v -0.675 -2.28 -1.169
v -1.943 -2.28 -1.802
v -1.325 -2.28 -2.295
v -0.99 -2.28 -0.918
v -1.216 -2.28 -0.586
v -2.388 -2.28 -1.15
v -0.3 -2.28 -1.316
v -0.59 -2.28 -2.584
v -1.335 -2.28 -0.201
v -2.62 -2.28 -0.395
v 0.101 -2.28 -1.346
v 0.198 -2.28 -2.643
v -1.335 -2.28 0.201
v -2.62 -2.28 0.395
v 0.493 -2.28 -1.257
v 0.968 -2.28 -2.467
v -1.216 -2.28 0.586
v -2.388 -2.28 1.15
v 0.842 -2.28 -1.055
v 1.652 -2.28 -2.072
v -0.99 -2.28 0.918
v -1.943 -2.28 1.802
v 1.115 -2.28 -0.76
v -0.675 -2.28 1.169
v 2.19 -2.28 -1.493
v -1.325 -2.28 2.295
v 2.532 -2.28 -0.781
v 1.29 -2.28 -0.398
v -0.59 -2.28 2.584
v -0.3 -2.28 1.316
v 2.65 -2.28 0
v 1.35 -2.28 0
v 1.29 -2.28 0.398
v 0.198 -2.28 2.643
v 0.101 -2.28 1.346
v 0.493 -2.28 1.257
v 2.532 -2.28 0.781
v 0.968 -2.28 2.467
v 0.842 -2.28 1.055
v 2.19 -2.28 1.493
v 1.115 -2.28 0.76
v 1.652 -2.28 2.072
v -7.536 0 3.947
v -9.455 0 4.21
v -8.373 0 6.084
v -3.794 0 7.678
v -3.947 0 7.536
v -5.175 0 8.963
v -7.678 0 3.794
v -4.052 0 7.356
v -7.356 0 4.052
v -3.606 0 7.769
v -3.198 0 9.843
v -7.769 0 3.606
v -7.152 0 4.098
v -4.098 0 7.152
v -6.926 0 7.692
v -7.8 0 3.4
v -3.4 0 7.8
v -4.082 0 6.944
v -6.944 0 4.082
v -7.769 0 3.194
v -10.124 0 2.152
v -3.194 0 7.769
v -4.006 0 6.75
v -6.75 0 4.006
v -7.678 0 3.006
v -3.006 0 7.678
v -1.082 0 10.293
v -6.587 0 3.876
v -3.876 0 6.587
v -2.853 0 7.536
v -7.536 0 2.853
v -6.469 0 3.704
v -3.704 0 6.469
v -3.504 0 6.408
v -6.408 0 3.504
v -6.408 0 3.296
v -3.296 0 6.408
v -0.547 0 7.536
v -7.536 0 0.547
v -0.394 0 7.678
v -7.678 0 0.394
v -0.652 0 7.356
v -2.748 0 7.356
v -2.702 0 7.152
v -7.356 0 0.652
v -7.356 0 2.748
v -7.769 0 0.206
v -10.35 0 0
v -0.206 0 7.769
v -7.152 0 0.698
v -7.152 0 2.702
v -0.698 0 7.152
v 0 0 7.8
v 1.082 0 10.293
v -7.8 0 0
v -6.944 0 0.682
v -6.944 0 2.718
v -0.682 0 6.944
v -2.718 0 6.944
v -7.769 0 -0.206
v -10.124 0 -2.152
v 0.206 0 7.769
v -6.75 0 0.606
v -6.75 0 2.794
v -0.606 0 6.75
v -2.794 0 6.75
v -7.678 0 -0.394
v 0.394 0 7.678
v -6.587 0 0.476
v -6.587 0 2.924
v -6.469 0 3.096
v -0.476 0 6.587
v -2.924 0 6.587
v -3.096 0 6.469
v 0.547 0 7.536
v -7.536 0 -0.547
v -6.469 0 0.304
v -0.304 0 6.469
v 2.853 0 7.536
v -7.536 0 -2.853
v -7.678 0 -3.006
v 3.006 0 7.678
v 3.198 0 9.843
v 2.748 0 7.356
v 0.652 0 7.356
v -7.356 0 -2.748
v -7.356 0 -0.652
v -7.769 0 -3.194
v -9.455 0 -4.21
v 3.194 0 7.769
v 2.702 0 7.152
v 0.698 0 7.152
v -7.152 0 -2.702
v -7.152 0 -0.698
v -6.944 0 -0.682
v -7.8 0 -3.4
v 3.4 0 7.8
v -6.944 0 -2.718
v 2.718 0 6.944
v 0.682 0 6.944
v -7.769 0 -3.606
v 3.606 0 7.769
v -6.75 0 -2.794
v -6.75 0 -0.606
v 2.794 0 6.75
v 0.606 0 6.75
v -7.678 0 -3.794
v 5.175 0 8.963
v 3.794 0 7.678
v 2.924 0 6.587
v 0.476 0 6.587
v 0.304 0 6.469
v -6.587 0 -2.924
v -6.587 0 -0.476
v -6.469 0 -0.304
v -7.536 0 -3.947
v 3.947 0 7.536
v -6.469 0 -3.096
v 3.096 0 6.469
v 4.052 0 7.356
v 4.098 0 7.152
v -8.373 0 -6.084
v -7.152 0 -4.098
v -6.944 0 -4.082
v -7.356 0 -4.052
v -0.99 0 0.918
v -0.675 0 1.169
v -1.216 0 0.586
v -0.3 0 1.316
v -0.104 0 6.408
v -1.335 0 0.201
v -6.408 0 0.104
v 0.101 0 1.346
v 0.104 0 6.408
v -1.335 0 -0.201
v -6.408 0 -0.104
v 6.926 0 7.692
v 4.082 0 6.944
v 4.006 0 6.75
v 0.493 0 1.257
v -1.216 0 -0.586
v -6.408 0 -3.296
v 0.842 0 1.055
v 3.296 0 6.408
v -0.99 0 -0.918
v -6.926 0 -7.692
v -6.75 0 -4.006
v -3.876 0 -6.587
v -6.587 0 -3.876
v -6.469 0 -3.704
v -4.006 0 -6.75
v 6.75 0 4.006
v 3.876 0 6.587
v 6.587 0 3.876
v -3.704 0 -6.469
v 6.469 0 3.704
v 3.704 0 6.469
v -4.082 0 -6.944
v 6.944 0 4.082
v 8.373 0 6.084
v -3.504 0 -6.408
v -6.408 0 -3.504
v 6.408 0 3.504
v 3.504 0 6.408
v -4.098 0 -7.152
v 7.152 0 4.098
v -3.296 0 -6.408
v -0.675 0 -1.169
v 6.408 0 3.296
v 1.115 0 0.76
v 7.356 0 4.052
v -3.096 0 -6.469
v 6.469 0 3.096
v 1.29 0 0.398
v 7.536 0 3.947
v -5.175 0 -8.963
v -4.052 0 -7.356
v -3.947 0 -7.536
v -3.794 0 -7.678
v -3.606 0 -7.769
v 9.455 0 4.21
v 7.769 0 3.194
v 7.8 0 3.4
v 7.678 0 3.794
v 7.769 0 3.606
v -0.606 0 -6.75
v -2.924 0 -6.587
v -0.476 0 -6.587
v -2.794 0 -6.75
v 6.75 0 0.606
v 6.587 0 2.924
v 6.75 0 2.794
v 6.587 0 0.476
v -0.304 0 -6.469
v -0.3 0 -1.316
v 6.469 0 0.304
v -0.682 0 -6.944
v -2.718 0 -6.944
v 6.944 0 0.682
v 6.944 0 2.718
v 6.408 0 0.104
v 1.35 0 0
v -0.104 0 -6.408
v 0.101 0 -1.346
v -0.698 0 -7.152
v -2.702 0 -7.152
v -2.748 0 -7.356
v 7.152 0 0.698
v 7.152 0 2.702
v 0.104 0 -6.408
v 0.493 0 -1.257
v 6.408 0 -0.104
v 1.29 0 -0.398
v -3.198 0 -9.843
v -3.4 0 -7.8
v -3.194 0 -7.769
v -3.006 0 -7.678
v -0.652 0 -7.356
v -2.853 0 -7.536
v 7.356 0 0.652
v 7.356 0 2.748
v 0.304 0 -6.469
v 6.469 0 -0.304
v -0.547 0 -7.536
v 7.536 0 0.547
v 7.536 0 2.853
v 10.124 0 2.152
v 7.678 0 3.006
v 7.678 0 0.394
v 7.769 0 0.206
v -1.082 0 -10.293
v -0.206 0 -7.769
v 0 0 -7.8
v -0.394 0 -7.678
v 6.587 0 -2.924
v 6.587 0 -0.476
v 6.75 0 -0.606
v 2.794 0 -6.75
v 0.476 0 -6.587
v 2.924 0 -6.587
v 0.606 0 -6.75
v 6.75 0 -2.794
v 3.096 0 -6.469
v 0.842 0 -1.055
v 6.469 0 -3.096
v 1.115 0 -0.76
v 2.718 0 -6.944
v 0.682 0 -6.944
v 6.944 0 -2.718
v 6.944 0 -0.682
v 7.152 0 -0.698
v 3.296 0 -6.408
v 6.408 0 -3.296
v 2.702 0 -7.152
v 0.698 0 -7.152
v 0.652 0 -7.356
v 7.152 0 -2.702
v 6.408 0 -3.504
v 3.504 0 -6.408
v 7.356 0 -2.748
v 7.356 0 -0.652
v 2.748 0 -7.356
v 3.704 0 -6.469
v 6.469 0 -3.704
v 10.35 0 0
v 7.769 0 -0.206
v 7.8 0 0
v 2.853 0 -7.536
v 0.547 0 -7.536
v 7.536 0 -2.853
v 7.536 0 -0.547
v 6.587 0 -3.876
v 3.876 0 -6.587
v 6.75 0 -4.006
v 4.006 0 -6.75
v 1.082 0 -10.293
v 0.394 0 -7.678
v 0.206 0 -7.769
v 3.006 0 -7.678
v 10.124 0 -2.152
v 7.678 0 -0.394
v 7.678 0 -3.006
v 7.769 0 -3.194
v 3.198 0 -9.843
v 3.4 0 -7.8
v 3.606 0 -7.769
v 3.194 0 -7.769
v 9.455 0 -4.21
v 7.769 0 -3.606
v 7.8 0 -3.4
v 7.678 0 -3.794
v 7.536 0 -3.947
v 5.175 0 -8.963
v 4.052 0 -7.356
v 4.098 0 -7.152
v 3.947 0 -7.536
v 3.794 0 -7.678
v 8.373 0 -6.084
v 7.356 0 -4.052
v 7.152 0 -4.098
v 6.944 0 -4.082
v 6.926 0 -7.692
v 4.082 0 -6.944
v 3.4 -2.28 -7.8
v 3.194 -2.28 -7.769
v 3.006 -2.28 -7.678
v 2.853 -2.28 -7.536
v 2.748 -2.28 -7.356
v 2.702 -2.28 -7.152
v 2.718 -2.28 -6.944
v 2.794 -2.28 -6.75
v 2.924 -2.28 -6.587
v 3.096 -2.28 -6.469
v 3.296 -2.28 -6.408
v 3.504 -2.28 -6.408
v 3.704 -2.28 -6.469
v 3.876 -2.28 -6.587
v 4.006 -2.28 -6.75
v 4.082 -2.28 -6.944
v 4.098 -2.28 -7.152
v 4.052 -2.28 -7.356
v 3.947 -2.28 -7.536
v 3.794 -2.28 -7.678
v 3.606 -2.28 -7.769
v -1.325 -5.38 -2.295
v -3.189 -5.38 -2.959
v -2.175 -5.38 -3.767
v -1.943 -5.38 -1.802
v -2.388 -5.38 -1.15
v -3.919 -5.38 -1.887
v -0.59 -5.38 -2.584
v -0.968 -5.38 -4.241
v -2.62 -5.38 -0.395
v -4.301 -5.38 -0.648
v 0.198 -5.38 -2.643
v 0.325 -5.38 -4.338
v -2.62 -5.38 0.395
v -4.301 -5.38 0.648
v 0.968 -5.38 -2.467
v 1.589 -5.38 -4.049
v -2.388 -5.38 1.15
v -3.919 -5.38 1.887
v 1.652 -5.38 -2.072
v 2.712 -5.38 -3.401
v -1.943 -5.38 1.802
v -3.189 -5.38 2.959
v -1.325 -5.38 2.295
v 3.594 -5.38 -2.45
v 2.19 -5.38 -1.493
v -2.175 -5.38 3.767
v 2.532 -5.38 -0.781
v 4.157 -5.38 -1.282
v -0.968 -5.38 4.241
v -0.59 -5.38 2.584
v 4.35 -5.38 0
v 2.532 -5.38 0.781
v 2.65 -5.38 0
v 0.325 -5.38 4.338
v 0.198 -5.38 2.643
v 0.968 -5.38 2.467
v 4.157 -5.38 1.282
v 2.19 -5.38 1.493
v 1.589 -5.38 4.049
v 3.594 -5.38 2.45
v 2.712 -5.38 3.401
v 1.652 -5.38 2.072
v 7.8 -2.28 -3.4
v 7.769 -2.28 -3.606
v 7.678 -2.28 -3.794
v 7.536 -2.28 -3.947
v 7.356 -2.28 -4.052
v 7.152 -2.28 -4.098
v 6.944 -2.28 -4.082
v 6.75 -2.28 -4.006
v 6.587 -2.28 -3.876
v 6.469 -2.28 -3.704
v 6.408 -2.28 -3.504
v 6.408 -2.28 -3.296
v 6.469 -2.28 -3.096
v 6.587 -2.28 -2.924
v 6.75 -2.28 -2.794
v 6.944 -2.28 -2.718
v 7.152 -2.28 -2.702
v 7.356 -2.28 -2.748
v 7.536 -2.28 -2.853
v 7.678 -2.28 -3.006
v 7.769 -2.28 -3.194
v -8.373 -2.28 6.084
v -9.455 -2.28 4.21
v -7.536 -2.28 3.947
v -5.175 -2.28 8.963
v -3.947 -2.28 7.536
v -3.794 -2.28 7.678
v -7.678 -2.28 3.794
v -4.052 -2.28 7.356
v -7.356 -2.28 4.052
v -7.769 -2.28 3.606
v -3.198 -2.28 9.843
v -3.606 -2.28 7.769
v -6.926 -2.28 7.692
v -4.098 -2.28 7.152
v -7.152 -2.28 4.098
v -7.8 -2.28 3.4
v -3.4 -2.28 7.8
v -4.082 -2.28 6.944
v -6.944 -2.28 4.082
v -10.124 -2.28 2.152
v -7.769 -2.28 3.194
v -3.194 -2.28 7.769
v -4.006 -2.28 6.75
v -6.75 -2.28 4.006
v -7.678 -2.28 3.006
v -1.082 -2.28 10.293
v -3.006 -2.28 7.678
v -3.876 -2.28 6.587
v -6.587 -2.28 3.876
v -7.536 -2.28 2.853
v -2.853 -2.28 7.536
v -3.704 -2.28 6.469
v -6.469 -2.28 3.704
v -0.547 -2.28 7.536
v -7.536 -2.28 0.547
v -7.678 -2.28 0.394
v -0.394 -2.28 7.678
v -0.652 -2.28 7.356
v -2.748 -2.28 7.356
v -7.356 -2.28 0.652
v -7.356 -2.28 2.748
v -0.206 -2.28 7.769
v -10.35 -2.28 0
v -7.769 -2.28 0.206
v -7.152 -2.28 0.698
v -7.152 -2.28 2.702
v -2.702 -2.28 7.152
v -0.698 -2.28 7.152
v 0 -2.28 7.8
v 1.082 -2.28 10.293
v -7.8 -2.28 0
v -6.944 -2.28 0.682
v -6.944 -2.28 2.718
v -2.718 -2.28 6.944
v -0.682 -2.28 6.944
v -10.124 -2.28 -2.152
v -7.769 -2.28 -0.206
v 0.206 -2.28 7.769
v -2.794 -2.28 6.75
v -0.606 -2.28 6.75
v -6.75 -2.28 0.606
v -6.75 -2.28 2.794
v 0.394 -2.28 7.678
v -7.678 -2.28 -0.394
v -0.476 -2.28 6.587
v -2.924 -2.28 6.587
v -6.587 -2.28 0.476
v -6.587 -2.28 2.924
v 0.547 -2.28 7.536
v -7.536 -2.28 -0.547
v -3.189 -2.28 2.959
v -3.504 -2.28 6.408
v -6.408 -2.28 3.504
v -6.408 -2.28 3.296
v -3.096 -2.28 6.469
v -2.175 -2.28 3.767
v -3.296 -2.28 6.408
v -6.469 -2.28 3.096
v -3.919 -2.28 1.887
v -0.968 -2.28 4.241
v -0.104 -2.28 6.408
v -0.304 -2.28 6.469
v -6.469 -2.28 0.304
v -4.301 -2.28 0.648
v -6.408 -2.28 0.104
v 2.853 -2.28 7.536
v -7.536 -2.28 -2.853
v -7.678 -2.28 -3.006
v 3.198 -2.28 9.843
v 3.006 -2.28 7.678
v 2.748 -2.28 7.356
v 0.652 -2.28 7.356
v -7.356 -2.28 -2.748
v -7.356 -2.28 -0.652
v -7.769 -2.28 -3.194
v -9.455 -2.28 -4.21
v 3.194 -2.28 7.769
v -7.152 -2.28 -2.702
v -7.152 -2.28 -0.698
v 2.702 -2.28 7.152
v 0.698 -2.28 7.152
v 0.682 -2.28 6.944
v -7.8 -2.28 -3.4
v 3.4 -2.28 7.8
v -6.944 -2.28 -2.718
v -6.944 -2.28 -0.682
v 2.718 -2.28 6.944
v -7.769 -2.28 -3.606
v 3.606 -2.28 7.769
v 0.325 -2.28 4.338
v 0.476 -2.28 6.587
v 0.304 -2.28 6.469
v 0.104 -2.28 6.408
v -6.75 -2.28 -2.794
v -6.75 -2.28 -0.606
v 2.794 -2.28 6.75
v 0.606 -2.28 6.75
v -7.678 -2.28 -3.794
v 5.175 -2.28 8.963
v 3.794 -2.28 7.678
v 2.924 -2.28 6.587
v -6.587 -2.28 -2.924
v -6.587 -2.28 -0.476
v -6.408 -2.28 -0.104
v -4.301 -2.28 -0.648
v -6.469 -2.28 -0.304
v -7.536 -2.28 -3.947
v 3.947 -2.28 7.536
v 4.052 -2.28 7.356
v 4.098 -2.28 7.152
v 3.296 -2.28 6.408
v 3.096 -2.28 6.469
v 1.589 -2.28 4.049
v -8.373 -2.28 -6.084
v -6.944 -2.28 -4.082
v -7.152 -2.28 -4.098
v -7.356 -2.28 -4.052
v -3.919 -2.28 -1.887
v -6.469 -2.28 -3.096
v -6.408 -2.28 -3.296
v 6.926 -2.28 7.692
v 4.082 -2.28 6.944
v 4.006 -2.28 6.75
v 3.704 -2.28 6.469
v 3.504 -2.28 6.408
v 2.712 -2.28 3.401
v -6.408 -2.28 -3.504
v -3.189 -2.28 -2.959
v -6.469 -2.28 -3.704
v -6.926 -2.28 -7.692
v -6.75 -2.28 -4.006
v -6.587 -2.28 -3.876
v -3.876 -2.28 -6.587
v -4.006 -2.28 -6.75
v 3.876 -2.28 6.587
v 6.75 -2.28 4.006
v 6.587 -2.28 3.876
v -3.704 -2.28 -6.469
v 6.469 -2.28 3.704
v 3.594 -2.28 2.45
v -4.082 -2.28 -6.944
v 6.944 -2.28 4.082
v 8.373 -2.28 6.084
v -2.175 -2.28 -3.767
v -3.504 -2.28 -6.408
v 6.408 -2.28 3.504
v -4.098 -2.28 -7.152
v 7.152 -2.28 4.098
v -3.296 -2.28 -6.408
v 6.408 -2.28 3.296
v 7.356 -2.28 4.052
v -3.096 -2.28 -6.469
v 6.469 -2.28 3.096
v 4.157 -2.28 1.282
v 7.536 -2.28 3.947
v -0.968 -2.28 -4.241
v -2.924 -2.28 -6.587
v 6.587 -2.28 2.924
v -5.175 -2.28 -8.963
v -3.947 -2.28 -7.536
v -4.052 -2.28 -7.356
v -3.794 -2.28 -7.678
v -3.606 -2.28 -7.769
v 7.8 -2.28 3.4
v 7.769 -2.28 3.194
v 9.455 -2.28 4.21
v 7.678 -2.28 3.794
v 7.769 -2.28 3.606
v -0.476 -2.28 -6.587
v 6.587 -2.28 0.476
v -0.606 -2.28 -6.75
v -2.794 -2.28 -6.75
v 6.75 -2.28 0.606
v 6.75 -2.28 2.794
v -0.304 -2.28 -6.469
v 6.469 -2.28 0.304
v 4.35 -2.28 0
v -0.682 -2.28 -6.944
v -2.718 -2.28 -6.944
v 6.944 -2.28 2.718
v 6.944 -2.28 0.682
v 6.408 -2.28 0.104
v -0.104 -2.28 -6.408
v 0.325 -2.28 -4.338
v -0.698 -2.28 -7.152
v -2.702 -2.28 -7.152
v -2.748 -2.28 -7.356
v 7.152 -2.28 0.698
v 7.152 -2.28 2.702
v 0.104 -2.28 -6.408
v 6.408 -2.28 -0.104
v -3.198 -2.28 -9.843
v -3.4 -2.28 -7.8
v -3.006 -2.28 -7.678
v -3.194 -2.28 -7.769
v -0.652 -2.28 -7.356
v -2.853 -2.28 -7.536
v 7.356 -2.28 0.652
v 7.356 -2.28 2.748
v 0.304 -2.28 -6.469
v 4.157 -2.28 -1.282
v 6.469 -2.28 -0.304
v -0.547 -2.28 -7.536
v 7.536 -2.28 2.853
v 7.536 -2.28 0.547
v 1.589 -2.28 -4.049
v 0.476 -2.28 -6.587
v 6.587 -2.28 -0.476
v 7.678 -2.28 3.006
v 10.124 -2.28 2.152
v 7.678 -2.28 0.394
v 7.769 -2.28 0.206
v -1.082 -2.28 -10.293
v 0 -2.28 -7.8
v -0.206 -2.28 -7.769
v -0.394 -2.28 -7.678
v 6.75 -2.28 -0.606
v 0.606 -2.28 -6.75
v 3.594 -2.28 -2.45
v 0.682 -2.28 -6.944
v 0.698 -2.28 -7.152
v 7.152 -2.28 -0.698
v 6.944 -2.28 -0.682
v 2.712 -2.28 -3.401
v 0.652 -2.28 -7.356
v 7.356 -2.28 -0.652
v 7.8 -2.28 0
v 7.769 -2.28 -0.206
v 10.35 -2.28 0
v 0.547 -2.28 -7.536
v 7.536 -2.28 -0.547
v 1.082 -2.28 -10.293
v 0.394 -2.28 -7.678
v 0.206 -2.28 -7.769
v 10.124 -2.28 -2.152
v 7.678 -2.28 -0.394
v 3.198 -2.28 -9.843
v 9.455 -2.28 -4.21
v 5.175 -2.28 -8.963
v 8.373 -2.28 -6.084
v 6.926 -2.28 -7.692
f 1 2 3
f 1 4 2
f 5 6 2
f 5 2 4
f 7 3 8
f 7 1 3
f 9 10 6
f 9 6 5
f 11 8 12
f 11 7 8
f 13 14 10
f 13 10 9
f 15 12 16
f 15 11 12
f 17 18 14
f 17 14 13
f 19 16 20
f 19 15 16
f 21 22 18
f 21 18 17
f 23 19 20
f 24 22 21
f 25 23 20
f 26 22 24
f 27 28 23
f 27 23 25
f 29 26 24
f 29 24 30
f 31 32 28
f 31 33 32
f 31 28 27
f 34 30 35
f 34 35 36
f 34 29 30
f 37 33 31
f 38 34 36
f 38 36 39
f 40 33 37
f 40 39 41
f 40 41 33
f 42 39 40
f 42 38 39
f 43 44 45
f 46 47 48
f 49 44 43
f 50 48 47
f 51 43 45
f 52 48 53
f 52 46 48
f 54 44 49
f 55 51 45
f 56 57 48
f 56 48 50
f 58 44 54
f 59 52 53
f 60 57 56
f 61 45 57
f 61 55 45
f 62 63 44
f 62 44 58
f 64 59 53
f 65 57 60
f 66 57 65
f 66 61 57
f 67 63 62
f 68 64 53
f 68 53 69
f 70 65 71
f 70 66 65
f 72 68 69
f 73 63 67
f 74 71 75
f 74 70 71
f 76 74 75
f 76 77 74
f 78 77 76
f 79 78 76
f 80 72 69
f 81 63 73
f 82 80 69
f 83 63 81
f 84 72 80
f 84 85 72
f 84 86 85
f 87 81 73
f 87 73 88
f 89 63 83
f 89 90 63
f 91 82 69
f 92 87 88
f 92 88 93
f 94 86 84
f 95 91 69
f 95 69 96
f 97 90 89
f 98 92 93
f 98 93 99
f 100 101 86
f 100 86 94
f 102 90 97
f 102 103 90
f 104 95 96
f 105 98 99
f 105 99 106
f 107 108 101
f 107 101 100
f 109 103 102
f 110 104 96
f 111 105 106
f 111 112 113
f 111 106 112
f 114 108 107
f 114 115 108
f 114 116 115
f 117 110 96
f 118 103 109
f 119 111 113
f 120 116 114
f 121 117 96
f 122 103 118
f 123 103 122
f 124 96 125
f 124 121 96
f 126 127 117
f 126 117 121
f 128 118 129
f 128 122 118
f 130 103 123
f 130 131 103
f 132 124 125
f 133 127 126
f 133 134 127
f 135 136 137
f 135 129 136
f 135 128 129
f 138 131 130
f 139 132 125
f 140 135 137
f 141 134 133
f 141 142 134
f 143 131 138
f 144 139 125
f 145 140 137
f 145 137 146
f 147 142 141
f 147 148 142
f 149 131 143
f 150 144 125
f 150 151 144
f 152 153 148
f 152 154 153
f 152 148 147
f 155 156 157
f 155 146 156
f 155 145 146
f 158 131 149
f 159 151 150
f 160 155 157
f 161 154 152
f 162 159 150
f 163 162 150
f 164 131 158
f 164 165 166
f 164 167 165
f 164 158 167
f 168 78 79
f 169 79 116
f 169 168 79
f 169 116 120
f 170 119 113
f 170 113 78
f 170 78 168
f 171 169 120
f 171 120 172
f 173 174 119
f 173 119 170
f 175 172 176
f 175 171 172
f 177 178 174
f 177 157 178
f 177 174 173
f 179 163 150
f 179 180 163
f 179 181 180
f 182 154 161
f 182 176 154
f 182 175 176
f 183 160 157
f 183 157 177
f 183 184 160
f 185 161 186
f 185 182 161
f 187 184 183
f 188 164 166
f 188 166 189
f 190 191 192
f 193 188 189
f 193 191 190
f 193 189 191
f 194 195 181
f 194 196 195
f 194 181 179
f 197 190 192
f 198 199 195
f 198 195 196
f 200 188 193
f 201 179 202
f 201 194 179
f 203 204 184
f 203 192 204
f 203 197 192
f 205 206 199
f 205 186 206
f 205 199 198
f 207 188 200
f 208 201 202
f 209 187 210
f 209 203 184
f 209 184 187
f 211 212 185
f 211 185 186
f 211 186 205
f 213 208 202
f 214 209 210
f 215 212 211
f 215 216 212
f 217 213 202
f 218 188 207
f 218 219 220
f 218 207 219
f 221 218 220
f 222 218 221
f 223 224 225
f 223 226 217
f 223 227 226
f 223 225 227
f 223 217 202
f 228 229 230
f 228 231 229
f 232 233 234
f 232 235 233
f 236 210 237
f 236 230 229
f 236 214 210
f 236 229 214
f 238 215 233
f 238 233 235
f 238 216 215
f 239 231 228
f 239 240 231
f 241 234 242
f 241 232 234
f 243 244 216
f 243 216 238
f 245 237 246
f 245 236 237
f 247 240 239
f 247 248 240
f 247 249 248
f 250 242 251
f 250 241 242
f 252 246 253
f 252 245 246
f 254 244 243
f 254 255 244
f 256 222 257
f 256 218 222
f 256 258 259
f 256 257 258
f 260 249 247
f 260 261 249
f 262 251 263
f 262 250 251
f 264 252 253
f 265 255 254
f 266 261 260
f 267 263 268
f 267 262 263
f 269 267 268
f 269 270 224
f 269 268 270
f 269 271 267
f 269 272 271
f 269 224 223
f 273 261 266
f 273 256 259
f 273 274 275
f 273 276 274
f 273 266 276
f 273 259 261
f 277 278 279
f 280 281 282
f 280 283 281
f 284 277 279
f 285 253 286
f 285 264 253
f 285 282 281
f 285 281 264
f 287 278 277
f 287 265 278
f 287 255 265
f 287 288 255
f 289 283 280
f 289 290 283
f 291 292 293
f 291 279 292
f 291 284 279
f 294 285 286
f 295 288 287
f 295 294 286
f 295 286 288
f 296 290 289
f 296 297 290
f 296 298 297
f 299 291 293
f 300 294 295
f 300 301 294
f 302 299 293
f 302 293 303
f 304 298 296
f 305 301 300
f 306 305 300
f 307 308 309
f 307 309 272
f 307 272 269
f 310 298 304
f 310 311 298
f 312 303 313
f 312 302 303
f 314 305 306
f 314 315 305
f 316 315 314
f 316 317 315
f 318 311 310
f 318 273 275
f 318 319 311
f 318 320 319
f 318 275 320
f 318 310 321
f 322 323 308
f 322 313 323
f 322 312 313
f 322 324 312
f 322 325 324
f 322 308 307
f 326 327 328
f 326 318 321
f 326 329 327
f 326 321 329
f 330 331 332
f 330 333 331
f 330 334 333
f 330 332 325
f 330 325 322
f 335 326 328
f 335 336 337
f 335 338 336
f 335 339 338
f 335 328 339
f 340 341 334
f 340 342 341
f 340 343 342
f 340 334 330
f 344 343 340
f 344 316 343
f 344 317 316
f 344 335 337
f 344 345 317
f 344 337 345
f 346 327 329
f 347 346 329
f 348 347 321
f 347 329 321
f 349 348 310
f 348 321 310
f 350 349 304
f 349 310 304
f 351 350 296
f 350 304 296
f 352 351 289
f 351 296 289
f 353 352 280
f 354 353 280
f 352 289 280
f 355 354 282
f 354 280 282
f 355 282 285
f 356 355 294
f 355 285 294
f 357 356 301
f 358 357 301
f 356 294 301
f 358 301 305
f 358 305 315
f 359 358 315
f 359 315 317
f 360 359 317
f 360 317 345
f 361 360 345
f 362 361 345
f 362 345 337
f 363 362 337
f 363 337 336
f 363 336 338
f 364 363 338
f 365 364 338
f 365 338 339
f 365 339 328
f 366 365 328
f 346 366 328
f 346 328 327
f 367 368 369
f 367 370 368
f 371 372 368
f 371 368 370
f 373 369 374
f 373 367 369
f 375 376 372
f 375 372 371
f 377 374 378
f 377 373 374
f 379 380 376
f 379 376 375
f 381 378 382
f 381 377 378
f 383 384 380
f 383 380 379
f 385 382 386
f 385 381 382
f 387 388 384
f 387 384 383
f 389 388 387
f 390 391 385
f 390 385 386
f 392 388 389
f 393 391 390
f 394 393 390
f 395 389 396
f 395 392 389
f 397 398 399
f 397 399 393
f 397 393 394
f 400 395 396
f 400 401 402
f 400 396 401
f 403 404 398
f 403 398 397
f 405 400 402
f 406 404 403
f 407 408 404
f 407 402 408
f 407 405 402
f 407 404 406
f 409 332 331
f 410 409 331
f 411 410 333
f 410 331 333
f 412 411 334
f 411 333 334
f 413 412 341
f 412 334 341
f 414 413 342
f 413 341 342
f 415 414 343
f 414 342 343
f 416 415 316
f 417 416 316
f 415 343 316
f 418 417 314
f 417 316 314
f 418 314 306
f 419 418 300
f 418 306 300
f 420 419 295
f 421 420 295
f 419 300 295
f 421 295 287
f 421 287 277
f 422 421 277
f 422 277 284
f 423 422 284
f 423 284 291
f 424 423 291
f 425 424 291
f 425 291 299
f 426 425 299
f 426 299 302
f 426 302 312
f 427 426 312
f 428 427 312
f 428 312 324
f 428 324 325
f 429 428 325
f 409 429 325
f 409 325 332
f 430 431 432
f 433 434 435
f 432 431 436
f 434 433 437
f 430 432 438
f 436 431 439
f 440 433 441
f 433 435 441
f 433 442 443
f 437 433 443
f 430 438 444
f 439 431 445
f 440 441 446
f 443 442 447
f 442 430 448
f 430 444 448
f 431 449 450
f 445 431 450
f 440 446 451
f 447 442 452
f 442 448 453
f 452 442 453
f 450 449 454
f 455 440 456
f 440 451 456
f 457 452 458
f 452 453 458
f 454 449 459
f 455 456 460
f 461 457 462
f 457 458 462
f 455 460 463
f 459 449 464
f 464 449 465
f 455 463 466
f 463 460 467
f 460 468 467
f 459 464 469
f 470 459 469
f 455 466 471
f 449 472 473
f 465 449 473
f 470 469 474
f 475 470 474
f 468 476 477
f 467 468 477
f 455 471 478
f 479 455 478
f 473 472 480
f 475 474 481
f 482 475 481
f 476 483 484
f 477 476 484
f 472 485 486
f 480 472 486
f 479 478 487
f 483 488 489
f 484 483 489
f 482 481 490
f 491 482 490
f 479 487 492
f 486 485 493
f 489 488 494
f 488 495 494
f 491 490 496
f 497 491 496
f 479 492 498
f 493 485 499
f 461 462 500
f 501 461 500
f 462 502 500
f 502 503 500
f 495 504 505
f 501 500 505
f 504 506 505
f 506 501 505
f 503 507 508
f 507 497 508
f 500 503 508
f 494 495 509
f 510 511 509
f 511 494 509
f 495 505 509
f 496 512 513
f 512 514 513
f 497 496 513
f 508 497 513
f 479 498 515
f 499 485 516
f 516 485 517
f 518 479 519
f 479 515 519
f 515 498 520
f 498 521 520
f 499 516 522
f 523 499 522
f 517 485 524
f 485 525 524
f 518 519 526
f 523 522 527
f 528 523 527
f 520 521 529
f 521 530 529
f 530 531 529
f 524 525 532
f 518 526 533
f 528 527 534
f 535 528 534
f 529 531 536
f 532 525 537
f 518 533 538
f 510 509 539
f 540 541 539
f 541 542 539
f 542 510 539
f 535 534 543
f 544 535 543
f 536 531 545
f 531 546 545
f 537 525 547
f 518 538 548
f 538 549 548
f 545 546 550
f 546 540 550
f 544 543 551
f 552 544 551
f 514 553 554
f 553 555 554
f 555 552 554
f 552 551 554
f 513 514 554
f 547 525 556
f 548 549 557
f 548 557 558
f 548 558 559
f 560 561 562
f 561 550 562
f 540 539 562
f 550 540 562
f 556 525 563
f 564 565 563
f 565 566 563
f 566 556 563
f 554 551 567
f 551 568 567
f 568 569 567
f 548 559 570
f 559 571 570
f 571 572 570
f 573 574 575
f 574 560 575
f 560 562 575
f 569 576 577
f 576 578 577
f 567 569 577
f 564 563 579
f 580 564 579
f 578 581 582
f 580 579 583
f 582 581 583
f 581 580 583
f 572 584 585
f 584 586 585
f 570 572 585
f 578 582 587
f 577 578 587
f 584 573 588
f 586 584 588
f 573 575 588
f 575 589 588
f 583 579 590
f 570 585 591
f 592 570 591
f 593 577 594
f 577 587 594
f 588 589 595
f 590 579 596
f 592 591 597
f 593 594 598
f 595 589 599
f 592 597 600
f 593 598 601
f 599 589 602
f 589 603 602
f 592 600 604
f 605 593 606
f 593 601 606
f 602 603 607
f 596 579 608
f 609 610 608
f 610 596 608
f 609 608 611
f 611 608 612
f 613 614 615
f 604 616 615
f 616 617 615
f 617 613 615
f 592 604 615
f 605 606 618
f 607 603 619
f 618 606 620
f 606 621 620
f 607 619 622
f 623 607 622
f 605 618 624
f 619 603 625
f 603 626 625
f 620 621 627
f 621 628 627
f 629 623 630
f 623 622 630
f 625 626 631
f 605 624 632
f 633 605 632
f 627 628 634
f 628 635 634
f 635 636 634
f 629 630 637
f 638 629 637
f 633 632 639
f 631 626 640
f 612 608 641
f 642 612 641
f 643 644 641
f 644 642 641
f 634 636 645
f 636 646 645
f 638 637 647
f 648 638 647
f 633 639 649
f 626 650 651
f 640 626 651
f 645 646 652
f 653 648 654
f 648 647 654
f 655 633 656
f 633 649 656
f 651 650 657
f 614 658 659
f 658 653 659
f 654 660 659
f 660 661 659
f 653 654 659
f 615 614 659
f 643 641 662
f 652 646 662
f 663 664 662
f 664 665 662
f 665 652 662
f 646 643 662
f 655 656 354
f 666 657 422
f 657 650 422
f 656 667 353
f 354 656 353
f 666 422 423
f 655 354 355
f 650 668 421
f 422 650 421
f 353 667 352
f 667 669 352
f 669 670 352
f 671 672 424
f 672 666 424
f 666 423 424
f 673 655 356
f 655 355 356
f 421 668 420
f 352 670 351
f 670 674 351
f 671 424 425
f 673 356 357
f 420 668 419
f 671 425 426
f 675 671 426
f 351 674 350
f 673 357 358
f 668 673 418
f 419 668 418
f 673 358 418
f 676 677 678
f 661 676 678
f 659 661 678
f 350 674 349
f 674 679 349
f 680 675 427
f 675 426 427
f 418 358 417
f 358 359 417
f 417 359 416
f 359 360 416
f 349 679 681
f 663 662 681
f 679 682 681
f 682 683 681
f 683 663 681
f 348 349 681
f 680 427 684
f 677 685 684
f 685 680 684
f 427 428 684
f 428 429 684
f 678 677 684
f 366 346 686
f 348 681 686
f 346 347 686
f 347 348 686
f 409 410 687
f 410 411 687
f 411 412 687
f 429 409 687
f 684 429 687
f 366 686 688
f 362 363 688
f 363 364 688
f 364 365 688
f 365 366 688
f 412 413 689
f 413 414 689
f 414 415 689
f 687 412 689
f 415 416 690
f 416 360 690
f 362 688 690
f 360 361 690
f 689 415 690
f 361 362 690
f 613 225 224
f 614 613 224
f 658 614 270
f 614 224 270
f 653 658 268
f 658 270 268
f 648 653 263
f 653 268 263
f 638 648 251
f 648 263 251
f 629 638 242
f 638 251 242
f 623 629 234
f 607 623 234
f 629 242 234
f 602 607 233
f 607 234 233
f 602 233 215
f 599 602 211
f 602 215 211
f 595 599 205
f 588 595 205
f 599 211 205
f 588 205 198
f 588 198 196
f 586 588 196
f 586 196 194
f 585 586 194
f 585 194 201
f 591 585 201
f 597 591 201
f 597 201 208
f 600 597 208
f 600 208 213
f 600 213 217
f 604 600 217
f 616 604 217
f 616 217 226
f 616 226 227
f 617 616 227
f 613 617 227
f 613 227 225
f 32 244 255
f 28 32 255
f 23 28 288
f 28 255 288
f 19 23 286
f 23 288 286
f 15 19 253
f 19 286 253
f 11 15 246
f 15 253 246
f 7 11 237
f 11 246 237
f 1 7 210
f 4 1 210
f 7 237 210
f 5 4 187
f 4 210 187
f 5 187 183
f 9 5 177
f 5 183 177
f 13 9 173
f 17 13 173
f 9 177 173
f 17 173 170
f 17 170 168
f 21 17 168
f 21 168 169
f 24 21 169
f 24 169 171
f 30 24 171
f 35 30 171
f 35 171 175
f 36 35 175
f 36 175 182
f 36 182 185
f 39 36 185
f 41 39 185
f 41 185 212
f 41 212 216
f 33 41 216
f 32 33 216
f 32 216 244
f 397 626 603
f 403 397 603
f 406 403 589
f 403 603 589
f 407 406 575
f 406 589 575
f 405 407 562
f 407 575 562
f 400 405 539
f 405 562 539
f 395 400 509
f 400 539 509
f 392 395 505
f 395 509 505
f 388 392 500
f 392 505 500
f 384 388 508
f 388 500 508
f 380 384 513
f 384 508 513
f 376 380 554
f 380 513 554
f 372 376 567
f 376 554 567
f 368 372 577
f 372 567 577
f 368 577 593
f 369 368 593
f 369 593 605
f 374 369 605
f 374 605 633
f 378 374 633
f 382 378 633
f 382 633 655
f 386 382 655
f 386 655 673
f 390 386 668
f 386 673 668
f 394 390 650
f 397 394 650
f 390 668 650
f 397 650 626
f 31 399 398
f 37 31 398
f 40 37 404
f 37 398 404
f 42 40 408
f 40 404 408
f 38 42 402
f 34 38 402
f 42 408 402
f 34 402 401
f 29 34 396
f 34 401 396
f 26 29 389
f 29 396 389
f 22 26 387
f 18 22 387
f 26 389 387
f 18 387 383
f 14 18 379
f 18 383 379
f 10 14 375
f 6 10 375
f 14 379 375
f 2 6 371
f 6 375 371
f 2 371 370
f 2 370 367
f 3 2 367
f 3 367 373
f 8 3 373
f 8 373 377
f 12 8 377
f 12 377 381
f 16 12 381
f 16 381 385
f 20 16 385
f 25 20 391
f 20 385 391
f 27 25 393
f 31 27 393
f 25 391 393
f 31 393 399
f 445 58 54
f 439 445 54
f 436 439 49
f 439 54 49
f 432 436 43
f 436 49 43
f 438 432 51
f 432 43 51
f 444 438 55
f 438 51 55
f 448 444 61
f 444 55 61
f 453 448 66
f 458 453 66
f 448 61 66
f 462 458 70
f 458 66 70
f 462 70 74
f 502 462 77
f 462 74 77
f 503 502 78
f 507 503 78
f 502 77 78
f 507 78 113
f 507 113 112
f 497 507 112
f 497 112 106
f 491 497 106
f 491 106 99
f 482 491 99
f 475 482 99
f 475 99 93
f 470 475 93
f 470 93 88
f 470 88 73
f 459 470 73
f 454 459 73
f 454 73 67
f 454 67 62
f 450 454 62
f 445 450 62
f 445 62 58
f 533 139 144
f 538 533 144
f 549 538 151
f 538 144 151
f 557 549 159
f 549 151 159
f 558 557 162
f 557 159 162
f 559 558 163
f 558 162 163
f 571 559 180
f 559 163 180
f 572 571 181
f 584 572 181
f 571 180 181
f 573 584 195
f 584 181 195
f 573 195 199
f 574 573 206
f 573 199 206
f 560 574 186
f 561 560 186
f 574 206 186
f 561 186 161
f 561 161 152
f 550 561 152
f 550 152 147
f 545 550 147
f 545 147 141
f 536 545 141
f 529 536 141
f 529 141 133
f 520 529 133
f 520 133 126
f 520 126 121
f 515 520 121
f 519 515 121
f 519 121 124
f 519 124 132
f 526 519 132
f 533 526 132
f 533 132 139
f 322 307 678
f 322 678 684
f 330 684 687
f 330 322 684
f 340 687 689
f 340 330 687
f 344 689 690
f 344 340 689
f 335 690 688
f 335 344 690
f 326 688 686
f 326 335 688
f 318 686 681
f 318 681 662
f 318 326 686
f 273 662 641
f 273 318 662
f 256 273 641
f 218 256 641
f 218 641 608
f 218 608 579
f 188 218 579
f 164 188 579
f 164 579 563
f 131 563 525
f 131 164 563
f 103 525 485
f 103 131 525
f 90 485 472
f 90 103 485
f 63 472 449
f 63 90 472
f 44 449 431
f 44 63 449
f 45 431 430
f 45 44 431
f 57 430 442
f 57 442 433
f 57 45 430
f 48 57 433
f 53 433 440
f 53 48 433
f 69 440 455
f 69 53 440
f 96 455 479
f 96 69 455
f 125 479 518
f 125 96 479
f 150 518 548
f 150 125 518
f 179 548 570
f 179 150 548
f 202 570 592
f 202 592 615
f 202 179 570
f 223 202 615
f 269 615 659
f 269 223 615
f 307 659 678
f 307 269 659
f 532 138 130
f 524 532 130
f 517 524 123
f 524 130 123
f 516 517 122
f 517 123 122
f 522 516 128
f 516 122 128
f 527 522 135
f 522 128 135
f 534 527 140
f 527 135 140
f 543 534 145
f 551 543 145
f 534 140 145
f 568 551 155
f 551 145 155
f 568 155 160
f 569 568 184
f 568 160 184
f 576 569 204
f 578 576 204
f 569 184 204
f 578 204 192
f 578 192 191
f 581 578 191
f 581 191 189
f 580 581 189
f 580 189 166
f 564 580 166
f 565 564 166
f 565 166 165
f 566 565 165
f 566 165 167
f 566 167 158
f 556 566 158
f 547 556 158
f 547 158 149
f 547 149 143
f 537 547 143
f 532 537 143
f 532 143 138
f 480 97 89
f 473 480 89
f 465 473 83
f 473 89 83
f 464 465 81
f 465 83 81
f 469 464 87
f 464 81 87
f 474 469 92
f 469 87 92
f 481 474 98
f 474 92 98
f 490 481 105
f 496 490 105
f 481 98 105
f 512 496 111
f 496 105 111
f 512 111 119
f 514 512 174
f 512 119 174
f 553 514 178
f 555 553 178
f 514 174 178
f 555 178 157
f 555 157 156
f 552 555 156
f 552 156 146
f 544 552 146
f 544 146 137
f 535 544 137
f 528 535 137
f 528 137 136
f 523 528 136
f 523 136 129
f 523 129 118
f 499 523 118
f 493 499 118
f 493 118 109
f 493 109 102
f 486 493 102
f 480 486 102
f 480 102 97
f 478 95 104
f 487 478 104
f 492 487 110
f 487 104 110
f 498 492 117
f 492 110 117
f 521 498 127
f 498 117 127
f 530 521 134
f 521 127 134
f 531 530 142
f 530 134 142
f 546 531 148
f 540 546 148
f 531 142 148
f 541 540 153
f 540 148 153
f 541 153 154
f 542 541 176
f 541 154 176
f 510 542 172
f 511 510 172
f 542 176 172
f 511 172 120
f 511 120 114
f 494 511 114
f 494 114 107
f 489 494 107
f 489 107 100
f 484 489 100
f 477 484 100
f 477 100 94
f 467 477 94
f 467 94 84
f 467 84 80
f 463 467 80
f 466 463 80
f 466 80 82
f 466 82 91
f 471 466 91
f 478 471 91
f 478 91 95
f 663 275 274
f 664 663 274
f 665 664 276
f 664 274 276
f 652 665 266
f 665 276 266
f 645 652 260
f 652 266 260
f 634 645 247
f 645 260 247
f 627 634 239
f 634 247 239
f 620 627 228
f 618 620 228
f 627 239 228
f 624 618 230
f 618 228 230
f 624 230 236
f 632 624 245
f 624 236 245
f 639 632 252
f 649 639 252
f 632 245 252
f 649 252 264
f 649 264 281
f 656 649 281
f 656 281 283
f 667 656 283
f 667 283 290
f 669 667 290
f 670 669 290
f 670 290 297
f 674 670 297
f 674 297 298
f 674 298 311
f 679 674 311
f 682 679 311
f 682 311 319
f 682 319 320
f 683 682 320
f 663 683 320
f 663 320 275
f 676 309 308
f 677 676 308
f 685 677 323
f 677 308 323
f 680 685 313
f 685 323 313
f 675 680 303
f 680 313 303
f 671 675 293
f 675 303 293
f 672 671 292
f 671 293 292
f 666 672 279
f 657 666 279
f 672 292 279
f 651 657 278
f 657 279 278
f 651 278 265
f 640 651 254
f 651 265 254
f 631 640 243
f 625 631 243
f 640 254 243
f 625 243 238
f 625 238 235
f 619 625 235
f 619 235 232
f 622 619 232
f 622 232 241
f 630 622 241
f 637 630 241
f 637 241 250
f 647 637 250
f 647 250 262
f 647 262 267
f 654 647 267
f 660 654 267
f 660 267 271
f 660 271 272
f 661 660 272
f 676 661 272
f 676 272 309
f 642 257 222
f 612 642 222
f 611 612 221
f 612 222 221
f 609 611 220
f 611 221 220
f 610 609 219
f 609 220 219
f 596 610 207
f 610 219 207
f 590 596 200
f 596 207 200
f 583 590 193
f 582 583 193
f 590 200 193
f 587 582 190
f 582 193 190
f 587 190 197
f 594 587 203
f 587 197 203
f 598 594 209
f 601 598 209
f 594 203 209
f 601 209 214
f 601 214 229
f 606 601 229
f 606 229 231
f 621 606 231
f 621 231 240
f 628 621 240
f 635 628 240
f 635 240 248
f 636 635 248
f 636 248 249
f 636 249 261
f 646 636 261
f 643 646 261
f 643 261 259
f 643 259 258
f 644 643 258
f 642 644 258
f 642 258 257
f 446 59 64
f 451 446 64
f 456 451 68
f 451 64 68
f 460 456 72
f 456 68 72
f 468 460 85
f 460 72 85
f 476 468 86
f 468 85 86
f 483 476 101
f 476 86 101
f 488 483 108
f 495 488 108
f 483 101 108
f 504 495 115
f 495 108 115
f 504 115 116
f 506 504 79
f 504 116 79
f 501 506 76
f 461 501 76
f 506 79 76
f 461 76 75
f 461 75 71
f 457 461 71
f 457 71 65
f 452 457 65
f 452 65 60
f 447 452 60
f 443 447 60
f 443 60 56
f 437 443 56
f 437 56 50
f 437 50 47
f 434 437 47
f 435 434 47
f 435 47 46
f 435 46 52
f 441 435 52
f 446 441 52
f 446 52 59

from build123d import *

# Parameters (mm, degrees)
SKETCH1_R           = 10.35
BOSS_EXTRUDE1_DEPTH = 2.28
SKETCH2_R           = 4.35
BOSS_EXTRUDE2_DEPTH = 3.1
SKETCH3_R           = 1.35
CUT_EXTRUDE1_DEPTH  = 6.38
SKETCH4_R           = 2.65
CUT_EXTRUDE2_DEPTH  = 3.1
SKETCH5_R           = 0.7
CUT_EXTRUDE3_DEPTH  = 3.1
CIRPATTERN1_COUNT   = 4


with BuildPart() as part:
    # Sketch1 → Boss-Extrude1 (new body)
    with BuildSketch(Plane(origin=(0, 0, 0), x_dir=(1, 0, 0), z_dir=(0, 1, 0))):
        Circle(SKETCH1_R)
    extrude(amount=-BOSS_EXTRUDE1_DEPTH)

    # Sketch2 → Boss-Extrude2 (add)
    with BuildSketch(Plane.XZ.offset(2.28)):
        Circle(SKETCH2_R)
    extrude(amount=BOSS_EXTRUDE2_DEPTH)

    # Sketch3 → Cut-Extrude1 (cut, through all)
    with BuildSketch(Plane(origin=(0, 0, 0), x_dir=(1, 0, 0), z_dir=(0, 1, 0))):
        Circle(SKETCH3_R)
    extrude(amount=-CUT_EXTRUDE1_DEPTH, mode=Mode.SUBTRACT)

    # Sketch4 → Cut-Extrude2 (cut)
    with BuildSketch(Plane.XZ.offset(5.38)):
        Circle(SKETCH4_R)
    extrude(amount=-CUT_EXTRUDE2_DEPTH, mode=Mode.SUBTRACT)

    # Sketch5 → Cut-Extrude3 (cut)
    with BuildSketch(Plane(origin=(0, 0, 0), x_dir=(1, 0, 0), z_dir=(0, 1, 0))):
        with Locations((7.1, 3.4)):
            Circle(SKETCH5_R)
        with Locations((7.1, 0)):
            Circle(SKETCH5_R)
        with Locations((7.1, -3.4)):
            Circle(SKETCH5_R)
    cut_extrude3 = extrude(amount=-CUT_EXTRUDE3_DEPTH, mode=Mode.SUBTRACT)

    # CirPattern1: Cut-Extrude3 ×4 about axis
    cirpattern1_axis = Axis((0, 0, 0), (0, 1, 0))
    for i in range(1, CIRPATTERN1_COUNT):
        add(cut_extrude3.rotate(cirpattern1_axis, i * 360 / CIRPATTERN1_COUNT), mode=Mode.SUBTRACT)


solid = part.part
